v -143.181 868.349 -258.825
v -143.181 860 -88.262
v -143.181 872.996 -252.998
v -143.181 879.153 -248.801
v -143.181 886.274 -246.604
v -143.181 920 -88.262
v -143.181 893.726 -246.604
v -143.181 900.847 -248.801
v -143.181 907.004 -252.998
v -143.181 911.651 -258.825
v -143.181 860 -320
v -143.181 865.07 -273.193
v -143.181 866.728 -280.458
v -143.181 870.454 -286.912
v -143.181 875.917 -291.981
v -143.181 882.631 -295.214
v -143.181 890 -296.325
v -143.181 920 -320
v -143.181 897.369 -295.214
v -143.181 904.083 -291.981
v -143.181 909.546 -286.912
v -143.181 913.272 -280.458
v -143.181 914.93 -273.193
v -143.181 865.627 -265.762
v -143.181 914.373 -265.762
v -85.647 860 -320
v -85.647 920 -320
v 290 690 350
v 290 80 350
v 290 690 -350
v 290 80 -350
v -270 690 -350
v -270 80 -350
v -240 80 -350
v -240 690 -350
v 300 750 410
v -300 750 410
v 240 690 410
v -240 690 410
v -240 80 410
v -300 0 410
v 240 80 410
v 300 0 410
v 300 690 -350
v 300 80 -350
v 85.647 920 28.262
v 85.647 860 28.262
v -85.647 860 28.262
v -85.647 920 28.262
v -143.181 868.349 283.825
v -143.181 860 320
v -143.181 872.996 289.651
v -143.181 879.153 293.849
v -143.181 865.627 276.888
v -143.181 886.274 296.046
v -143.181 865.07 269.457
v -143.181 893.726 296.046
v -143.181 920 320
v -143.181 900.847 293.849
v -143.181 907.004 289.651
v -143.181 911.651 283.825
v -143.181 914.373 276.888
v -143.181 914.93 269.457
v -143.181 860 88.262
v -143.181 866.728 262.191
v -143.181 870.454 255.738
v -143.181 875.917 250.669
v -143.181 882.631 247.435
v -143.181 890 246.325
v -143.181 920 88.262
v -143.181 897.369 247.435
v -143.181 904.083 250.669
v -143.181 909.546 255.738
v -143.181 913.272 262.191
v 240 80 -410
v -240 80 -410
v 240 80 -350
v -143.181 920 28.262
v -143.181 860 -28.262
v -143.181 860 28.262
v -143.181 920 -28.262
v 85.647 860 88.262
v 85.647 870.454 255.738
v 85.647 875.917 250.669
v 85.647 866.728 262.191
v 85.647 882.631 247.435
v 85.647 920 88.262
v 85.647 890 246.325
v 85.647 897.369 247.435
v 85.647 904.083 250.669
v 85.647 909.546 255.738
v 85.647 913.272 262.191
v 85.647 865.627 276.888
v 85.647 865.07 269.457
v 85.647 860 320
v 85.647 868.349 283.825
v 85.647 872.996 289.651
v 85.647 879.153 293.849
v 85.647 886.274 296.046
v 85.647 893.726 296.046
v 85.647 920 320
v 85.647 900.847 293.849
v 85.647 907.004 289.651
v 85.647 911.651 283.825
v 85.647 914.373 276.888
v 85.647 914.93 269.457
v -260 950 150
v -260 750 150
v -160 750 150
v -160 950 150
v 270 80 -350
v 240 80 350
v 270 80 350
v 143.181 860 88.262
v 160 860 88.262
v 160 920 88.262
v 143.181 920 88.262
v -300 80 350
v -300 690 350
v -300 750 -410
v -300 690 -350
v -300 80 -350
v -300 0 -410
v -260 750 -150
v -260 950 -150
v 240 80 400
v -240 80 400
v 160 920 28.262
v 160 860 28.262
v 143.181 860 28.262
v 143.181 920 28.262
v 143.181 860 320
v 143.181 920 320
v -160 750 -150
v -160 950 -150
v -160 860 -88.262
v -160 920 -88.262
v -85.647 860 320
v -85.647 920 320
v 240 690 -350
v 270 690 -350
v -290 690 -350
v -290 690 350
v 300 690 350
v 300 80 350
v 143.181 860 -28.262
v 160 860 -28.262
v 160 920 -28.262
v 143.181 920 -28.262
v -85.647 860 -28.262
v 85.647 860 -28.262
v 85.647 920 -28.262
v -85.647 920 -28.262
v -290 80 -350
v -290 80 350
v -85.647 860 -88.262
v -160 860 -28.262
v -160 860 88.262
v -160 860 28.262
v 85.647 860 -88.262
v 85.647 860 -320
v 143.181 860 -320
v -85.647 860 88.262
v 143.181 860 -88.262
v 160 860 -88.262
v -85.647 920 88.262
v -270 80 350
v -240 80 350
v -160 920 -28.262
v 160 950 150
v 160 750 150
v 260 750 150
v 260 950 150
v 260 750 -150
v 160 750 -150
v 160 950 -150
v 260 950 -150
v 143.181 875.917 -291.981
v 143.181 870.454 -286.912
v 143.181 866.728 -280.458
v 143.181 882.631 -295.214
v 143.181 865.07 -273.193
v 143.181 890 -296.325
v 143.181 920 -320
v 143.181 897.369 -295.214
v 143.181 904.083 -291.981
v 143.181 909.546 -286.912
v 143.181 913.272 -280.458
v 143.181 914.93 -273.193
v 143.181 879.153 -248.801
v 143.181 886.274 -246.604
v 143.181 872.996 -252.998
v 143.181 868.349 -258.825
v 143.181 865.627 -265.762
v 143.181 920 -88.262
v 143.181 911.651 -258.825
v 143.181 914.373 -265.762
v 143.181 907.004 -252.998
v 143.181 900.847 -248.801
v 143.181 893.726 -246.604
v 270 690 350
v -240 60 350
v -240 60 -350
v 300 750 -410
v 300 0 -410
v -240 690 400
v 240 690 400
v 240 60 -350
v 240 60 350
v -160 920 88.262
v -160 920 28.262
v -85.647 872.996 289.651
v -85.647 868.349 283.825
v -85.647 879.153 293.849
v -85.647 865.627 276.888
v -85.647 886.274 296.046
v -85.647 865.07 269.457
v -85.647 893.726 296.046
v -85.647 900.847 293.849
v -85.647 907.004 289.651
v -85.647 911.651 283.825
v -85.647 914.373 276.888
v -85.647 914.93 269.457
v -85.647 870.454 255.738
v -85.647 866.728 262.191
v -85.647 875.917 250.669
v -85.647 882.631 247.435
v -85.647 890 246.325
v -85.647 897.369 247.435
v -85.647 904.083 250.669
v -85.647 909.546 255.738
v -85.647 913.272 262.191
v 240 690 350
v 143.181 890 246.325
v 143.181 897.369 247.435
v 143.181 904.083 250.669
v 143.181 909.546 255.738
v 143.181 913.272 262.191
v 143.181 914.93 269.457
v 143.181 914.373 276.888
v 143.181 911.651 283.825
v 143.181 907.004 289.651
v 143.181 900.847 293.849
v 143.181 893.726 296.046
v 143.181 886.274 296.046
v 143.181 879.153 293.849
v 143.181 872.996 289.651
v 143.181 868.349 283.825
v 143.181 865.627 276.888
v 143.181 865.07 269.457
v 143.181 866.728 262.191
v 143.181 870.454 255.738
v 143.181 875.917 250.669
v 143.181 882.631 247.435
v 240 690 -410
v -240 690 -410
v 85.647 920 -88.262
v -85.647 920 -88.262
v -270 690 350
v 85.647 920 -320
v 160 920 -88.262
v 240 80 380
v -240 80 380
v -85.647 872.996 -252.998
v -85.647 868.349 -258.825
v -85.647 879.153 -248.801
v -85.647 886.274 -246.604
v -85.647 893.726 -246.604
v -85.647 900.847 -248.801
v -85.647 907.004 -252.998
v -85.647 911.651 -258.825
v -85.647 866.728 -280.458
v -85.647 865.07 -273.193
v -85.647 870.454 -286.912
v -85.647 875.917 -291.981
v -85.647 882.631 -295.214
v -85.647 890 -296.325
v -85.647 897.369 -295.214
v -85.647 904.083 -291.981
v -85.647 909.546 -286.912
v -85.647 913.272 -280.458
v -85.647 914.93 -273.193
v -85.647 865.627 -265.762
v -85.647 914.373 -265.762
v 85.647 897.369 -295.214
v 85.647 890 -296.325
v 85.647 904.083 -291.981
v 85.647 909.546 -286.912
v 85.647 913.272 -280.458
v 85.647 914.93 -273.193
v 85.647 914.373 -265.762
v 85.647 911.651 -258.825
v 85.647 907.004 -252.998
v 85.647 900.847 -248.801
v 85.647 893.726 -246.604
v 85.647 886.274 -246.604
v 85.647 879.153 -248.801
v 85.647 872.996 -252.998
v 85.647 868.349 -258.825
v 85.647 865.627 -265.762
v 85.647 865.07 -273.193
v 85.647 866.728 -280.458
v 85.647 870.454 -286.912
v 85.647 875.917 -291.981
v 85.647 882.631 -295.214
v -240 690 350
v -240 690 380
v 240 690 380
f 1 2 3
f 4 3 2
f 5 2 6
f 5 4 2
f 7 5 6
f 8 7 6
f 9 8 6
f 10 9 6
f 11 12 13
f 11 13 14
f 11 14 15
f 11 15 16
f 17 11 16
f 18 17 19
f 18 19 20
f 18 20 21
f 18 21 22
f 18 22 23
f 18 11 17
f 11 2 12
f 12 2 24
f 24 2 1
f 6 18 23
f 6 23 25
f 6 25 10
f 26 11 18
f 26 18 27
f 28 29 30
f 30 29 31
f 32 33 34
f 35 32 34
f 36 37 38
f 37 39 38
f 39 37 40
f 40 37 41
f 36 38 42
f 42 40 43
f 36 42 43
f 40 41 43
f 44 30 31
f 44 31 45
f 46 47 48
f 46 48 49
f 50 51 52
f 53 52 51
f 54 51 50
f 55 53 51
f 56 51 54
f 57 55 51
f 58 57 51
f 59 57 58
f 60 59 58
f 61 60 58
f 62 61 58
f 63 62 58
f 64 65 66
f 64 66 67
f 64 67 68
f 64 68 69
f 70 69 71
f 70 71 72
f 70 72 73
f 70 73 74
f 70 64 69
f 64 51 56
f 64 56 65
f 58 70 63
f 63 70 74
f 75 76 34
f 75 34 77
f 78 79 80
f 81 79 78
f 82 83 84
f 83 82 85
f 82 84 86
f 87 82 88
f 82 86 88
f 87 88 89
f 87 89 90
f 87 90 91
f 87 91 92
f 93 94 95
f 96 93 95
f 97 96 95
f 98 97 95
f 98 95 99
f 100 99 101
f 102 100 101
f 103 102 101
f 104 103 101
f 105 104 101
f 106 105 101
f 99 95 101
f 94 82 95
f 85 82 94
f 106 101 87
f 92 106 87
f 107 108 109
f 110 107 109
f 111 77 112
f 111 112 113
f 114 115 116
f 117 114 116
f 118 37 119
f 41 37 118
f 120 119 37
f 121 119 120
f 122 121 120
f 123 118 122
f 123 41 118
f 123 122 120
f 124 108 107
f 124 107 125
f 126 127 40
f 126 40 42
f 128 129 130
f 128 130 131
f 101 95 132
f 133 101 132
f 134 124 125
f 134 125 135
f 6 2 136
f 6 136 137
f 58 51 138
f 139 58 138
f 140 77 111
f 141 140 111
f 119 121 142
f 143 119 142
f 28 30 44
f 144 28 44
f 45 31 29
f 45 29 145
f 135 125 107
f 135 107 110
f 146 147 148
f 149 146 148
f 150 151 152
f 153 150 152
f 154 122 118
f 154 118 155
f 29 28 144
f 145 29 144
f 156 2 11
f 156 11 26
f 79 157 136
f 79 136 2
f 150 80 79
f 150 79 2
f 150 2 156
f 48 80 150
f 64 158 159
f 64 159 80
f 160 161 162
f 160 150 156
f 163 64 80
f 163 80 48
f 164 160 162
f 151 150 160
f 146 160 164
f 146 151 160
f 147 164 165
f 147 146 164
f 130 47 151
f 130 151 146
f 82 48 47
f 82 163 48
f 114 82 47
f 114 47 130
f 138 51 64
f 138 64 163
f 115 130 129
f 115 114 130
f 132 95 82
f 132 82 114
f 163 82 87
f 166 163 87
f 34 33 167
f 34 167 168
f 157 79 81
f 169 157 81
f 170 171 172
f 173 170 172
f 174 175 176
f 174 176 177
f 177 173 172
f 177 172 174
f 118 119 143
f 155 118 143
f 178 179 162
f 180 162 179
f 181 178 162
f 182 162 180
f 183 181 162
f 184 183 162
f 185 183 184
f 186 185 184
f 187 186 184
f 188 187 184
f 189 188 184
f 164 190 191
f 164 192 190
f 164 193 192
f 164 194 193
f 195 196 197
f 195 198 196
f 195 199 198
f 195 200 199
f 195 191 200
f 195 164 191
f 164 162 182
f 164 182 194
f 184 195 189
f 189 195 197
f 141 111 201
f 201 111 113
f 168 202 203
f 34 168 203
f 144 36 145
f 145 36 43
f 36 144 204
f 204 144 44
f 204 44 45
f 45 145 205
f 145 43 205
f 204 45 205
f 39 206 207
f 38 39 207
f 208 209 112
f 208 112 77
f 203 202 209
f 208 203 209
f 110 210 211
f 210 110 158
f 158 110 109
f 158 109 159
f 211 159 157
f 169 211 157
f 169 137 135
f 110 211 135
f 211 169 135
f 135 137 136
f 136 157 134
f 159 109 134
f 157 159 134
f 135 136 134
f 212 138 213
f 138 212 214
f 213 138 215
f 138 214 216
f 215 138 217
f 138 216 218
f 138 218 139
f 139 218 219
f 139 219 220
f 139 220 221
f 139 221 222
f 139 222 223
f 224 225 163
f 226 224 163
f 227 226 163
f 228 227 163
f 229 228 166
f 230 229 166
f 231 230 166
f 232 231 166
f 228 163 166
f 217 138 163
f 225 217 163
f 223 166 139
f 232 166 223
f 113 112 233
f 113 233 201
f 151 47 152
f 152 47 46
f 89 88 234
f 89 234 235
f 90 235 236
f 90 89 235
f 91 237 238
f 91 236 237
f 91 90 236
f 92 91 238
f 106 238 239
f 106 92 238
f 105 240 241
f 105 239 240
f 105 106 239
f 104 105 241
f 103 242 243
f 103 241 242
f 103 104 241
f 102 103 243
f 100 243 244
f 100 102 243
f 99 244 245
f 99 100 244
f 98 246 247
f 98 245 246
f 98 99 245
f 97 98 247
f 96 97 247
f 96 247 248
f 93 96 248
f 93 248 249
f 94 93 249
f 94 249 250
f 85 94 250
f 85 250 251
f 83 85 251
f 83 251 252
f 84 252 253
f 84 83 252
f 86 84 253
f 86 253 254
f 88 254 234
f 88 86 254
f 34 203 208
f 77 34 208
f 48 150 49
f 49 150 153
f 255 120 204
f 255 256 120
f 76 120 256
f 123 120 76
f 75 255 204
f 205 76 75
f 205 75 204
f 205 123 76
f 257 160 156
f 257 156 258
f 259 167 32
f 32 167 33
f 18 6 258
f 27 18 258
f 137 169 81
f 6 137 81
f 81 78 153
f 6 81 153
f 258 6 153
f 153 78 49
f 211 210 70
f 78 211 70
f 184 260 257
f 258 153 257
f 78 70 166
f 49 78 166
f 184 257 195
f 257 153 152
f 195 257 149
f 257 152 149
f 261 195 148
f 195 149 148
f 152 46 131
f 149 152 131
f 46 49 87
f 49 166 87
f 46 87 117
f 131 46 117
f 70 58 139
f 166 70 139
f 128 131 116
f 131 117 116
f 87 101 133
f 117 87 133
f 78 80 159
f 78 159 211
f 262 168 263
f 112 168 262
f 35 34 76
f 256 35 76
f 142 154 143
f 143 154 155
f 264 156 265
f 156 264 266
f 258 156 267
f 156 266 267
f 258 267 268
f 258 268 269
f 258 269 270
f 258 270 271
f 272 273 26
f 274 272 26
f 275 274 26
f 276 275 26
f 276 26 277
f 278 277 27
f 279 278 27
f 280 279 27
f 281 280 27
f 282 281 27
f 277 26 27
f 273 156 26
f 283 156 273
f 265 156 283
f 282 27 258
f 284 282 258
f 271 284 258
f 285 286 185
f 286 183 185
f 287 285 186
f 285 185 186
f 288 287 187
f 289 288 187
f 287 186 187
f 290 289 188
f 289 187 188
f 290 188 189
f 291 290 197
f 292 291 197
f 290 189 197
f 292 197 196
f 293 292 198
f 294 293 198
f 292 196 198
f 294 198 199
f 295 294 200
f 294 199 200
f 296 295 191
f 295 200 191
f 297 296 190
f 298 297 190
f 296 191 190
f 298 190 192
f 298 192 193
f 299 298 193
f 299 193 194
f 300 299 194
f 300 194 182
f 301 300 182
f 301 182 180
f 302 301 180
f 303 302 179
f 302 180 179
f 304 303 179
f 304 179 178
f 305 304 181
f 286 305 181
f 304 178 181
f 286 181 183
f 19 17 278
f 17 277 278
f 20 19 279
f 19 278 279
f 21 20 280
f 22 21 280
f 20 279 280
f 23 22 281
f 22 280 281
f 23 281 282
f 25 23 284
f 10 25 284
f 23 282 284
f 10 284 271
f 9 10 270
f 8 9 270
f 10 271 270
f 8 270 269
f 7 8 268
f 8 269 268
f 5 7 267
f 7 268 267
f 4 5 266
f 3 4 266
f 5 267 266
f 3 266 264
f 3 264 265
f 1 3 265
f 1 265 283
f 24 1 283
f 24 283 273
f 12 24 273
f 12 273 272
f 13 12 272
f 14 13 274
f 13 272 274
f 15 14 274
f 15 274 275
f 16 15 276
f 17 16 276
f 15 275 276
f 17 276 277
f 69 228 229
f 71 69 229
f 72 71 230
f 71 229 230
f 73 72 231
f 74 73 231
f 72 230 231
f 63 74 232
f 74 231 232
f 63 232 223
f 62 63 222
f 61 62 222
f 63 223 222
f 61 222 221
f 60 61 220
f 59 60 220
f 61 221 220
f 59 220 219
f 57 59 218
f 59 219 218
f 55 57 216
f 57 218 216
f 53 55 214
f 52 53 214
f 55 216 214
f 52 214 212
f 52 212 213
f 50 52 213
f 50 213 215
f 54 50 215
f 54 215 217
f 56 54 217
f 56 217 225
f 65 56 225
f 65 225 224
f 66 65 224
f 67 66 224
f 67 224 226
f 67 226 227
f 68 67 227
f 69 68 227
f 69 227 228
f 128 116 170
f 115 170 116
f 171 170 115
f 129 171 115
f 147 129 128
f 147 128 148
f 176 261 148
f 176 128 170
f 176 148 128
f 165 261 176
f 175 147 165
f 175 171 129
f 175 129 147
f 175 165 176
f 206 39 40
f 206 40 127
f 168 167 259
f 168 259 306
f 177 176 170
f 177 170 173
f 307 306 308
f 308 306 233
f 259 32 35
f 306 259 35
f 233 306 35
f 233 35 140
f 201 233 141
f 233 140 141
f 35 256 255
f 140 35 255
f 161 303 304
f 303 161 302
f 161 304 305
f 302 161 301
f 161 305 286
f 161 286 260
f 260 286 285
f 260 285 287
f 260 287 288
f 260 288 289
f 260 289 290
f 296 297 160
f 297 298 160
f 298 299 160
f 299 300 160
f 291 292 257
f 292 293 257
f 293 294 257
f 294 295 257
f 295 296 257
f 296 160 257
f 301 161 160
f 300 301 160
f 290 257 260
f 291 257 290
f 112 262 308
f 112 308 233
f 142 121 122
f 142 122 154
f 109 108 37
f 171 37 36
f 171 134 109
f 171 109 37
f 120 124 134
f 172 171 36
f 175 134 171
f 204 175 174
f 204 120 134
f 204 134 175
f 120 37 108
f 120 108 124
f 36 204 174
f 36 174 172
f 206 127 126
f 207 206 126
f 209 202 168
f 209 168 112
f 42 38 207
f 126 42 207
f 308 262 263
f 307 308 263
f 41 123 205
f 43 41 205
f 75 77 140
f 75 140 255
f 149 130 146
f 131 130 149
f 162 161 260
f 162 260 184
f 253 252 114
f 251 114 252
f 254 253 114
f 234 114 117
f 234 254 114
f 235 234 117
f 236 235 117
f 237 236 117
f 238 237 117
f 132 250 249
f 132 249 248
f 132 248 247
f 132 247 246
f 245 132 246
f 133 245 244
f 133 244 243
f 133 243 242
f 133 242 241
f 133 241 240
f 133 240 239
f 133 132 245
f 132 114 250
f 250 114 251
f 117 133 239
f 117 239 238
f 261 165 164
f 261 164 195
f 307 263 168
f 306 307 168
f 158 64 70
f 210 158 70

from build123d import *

# Parameters (mm, degrees)
SKETCH2_W            = 480
SKETCH2_H            = 700
BOSS_EXTRUDE1_DEPTH  = 60
SKETCH3_W            = 600
SKETCH3_H            = 820
SKETCH3_W_2          = 480
SKETCH3_H_2          = 700
BOSS_EXTRUDE4_DEPTH  = 80
SKETCH5_W            = 60
SKETCH5_H            = 60
BOSS_EXTRUDE5_DEPTH  = 610
SKETCH7_W            = 600
SKETCH7_H            = 820
BOSS_EXTRUDE6_DEPTH  = 60
BOSS_EXTRUDE7_DEPTH  = 670
SKETCH21_W           = 100
SKETCH21_H           = 300
BOSS_EXTRUDE13_DEPTH = 200
SKETCH28_W           = 60
SKETCH28_H           = 60
BOSS_EXTRUDE18_DEPTH = 520
SKETCH29_W           = 57.5339273
SKETCH29_H           = 60
BOSS_EXTRUDE19_DEPTH = 320
SKETCH30_R           = 25
CUT_EXTRUDE1_DEPTH   = 320


with BuildPart() as part:
    # Sketch2 → Boss-Extrude1 (new body)
    with BuildSketch(Plane(origin=(0, 0, 0), x_dir=(1, 0, 0), z_dir=(0, 1, 0))):
        Rectangle(SKETCH2_W, SKETCH2_H)
    extrude(amount=BOSS_EXTRUDE1_DEPTH)

    # Sketch3 → Boss-Extrude4 (add)
    with BuildSketch(Plane(origin=(0, 0, 0), x_dir=(1, 0, 0), z_dir=(0, 1, 0))):
        Rectangle(SKETCH3_W, SKETCH3_H)
        Rectangle(SKETCH3_W_2, SKETCH3_H_2, mode=Mode.SUBTRACT)
    extrude(amount=BOSS_EXTRUDE4_DEPTH)

    # Sketch5 → Boss-Extrude5 (add)
    with BuildSketch(Plane(origin=(0, 80, 0), x_dir=(1, 0, 0), z_dir=(0, 1, 0))):
        with Locations((270, 380)):
            Rectangle(SKETCH5_W, SKETCH5_H)
        with Locations((-270, 380)):
            Rectangle(SKETCH5_W, SKETCH5_H)
        with Locations((270, -380)):
            Rectangle(SKETCH5_W, SKETCH5_H)
        with Locations((-270, -380)):
            Rectangle(SKETCH5_W, SKETCH5_H)
    extrude(amount=BOSS_EXTRUDE5_DEPTH)

    # Sketch7 → Boss-Extrude6 (add)
    with BuildSketch(Plane(origin=(0, 690, 0), x_dir=(1, 0, 0), z_dir=(0, 1, 0))):
        Rectangle(SKETCH7_W, SKETCH7_H)
    extrude(amount=BOSS_EXTRUDE6_DEPTH)

    # Sketch10 → Boss-Extrude7 (add)
    with BuildSketch(Plane(origin=(0, 80, 0), x_dir=(1, 0, 0), z_dir=(0, 1, 0))):
        Polygon((270, -380), (-270, -380), (-270, 380), (-290, 380), (-290, -400), (290, -400), (290, 380), (270, 380), align=None)
    extrude(amount=BOSS_EXTRUDE7_DEPTH)

    # Sketch21 → Boss-Extrude13 (add)
    with BuildSketch(Plane(origin=(0, 750, 0), x_dir=(1, 0, 0), z_dir=(0, 1, 0))):
        with Locations((-210, 0)):
            Rectangle(SKETCH21_W, SKETCH21_H)
        with Locations((210, 0)):
            Rectangle(SKETCH21_W, SKETCH21_H)
    extrude(amount=BOSS_EXTRUDE13_DEPTH)

    # Sketch28 → Boss-Extrude18 (add)
    with BuildSketch(Plane(origin=(260, 0, 0), x_dir=(0, 0, -1), z_dir=(1, 0, 0))):
        with Locations((58.262274835, 890)):
            Rectangle(SKETCH28_W, SKETCH28_H)
        with Locations((-58.262274835, 890)):
            Rectangle(SKETCH28_W, SKETCH28_H)
    extrude(amount=-BOSS_EXTRUDE18_DEPTH)

    # Sketch29 → Boss-Extrude19 (add, symmetric)
    with BuildSketch(Plane.XY):
        with Locations((-114.414059972, 890)):
            Rectangle(SKETCH29_W, SKETCH29_H)
        with Locations((114.414059972, 890)):
            Rectangle(SKETCH29_W, SKETCH29_H)
    extrude(amount=BOSS_EXTRUDE19_DEPTH, both=True)

    # Sketch30 → Cut-Extrude1 (cut, symmetric)
    with BuildSketch(Plane(origin=(0, 0, 0), x_dir=(0, 0, -1), z_dir=(1, 0, 0))):
        with Locations((-271.32477079, 890)):
            Circle(SKETCH30_R)
        with Locations((271.32477079, 890)):
            Circle(SKETCH30_R)
    extrude(amount=CUT_EXTRUDE1_DEPTH, both=True, mode=Mode.SUBTRACT)


solid = part.part
